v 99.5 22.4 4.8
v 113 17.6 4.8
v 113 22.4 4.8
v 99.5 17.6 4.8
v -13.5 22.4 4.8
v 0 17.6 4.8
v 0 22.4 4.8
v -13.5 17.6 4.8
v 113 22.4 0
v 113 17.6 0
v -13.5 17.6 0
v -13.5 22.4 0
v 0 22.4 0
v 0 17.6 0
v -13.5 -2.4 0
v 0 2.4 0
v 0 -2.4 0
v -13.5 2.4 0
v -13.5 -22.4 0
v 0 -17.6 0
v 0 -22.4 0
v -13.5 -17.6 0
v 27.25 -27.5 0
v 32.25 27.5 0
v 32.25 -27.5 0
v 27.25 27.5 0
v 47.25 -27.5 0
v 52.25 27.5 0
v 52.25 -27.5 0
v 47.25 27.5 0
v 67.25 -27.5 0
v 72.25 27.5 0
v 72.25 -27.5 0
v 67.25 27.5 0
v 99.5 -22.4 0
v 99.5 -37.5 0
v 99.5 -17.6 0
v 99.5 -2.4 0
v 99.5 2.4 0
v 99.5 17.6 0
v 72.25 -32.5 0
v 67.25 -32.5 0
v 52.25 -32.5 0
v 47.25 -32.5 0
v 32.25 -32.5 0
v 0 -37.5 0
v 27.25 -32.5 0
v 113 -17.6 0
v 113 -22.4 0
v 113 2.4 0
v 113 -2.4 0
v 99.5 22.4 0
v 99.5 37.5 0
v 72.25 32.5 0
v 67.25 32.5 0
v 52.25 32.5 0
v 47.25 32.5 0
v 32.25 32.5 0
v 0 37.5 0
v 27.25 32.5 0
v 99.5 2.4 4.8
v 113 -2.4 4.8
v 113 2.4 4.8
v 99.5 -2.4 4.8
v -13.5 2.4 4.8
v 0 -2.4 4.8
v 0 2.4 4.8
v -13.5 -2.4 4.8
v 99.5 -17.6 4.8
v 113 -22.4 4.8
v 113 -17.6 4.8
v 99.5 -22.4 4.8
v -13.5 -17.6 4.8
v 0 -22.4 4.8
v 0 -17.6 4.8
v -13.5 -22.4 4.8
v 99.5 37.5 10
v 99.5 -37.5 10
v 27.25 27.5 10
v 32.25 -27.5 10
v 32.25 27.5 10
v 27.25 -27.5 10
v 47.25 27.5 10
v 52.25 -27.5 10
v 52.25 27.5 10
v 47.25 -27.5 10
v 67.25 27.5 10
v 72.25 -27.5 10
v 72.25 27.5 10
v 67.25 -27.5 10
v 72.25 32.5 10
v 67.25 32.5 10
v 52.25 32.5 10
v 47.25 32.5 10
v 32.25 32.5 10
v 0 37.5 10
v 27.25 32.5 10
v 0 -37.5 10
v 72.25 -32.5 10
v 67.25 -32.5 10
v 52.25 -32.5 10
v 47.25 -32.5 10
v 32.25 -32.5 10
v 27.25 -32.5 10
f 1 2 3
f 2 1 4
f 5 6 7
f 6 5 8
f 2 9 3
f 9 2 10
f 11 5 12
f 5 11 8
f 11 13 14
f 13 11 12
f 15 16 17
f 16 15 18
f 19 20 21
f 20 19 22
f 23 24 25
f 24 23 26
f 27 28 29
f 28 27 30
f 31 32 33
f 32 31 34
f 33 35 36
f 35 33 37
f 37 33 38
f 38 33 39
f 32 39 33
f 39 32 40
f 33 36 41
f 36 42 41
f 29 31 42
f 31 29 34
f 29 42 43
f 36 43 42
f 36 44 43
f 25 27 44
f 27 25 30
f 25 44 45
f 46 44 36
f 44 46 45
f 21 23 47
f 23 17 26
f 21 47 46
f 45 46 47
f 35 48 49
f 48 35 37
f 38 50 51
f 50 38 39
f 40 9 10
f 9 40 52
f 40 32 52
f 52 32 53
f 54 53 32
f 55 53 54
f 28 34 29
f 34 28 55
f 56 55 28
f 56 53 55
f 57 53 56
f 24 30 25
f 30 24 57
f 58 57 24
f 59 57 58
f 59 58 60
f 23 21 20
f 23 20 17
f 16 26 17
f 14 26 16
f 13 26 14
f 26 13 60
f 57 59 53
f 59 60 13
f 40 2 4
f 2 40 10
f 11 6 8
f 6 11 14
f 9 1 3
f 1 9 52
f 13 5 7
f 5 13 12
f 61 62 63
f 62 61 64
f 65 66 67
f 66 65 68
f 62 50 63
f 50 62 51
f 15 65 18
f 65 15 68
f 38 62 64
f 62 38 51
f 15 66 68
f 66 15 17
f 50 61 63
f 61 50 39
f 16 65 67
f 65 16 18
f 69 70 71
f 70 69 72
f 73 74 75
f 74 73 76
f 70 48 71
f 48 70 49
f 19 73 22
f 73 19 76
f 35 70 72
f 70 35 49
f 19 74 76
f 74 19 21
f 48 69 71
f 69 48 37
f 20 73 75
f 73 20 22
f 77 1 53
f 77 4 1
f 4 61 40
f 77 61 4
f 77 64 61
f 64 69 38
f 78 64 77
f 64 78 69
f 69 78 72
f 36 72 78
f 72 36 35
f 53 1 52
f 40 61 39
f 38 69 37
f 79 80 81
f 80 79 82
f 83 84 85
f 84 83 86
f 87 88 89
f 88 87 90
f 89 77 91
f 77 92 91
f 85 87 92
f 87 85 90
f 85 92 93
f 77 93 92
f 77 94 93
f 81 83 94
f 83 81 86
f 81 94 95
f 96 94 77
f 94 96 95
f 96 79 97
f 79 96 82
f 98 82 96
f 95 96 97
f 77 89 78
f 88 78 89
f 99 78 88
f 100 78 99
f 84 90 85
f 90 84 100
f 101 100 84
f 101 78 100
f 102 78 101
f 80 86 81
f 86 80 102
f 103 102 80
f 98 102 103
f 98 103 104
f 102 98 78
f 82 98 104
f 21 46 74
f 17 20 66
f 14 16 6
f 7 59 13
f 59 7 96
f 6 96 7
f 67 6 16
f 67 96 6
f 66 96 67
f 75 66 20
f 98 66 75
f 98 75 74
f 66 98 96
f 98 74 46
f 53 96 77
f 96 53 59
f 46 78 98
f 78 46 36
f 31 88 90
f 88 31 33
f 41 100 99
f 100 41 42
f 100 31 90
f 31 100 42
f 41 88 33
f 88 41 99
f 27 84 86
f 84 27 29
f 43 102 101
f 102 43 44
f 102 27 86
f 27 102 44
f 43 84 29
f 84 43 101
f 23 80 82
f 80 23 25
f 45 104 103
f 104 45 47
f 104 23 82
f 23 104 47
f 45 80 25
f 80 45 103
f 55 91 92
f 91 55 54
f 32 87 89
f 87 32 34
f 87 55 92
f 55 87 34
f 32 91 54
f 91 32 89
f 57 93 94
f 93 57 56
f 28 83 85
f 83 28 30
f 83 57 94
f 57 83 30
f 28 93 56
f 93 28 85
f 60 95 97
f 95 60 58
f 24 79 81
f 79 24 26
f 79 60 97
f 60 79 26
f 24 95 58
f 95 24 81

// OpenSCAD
// file: ../helper/nut_mount_connector.scad
/*
  Author: Johannes Bayer, 2025
  License: MIT
  Description: Connector between Portal and Trapezoidal Thread Nut Mount
*/

SPIND_CON_SQUARE_SIDE = 5;
SPIND_CON_DIST = 20;
TIGHT_FIT = 0.2;

module nut_mount_connector(length=100, male=false){

    edge_len = SPIND_CON_SQUARE_SIDE - (male?TIGHT_FIT:0);

    for (shift=[-SPIND_CON_DIST,0,SPIND_CON_DIST])
        translate([0, shift-edge_len/2, 0])
            cube([edge_len, edge_len, length]);

}

// Sample Usage
//nut_mount_connector();
// main file
$fn=120;

include <../helper/nut_mount_connector.scad>

/*
  Author: Johannes Bayer, 2025
  License: MIT
  Description: Connects two Linear Rail Support Wagons or Portals with a Thread Nut Holder
*/

PORTAL_DIST = 99.5;
PORTAL_THICK = 13.5;
MOUNT_WIDTH = 75;
MOUNT_HEIGHT = 10;
THREAD_ROD_DIA = 10.0;
TOLERANCE = 0.01;


difference(){
    union(){
        translate([0,-MOUNT_WIDTH/2,0])
            cube([PORTAL_DIST, MOUNT_WIDTH, MOUNT_HEIGHT]);
        translate([-PORTAL_THICK,0,0])
            rotate([0,-90,180])
                nut_mount_connector(length=PORTAL_DIST+2*PORTAL_THICK,
                                    male=true);
    }
    for (y_shift=[-MOUNT_WIDTH/2+5, MOUNT_WIDTH/2-10])
        translate([PORTAL_DIST/2,y_shift,-TOLERANCE])
            rotate([0,0,90])
                nut_mount_connector(length=MOUNT_HEIGHT+2*TOLERANCE);
};
